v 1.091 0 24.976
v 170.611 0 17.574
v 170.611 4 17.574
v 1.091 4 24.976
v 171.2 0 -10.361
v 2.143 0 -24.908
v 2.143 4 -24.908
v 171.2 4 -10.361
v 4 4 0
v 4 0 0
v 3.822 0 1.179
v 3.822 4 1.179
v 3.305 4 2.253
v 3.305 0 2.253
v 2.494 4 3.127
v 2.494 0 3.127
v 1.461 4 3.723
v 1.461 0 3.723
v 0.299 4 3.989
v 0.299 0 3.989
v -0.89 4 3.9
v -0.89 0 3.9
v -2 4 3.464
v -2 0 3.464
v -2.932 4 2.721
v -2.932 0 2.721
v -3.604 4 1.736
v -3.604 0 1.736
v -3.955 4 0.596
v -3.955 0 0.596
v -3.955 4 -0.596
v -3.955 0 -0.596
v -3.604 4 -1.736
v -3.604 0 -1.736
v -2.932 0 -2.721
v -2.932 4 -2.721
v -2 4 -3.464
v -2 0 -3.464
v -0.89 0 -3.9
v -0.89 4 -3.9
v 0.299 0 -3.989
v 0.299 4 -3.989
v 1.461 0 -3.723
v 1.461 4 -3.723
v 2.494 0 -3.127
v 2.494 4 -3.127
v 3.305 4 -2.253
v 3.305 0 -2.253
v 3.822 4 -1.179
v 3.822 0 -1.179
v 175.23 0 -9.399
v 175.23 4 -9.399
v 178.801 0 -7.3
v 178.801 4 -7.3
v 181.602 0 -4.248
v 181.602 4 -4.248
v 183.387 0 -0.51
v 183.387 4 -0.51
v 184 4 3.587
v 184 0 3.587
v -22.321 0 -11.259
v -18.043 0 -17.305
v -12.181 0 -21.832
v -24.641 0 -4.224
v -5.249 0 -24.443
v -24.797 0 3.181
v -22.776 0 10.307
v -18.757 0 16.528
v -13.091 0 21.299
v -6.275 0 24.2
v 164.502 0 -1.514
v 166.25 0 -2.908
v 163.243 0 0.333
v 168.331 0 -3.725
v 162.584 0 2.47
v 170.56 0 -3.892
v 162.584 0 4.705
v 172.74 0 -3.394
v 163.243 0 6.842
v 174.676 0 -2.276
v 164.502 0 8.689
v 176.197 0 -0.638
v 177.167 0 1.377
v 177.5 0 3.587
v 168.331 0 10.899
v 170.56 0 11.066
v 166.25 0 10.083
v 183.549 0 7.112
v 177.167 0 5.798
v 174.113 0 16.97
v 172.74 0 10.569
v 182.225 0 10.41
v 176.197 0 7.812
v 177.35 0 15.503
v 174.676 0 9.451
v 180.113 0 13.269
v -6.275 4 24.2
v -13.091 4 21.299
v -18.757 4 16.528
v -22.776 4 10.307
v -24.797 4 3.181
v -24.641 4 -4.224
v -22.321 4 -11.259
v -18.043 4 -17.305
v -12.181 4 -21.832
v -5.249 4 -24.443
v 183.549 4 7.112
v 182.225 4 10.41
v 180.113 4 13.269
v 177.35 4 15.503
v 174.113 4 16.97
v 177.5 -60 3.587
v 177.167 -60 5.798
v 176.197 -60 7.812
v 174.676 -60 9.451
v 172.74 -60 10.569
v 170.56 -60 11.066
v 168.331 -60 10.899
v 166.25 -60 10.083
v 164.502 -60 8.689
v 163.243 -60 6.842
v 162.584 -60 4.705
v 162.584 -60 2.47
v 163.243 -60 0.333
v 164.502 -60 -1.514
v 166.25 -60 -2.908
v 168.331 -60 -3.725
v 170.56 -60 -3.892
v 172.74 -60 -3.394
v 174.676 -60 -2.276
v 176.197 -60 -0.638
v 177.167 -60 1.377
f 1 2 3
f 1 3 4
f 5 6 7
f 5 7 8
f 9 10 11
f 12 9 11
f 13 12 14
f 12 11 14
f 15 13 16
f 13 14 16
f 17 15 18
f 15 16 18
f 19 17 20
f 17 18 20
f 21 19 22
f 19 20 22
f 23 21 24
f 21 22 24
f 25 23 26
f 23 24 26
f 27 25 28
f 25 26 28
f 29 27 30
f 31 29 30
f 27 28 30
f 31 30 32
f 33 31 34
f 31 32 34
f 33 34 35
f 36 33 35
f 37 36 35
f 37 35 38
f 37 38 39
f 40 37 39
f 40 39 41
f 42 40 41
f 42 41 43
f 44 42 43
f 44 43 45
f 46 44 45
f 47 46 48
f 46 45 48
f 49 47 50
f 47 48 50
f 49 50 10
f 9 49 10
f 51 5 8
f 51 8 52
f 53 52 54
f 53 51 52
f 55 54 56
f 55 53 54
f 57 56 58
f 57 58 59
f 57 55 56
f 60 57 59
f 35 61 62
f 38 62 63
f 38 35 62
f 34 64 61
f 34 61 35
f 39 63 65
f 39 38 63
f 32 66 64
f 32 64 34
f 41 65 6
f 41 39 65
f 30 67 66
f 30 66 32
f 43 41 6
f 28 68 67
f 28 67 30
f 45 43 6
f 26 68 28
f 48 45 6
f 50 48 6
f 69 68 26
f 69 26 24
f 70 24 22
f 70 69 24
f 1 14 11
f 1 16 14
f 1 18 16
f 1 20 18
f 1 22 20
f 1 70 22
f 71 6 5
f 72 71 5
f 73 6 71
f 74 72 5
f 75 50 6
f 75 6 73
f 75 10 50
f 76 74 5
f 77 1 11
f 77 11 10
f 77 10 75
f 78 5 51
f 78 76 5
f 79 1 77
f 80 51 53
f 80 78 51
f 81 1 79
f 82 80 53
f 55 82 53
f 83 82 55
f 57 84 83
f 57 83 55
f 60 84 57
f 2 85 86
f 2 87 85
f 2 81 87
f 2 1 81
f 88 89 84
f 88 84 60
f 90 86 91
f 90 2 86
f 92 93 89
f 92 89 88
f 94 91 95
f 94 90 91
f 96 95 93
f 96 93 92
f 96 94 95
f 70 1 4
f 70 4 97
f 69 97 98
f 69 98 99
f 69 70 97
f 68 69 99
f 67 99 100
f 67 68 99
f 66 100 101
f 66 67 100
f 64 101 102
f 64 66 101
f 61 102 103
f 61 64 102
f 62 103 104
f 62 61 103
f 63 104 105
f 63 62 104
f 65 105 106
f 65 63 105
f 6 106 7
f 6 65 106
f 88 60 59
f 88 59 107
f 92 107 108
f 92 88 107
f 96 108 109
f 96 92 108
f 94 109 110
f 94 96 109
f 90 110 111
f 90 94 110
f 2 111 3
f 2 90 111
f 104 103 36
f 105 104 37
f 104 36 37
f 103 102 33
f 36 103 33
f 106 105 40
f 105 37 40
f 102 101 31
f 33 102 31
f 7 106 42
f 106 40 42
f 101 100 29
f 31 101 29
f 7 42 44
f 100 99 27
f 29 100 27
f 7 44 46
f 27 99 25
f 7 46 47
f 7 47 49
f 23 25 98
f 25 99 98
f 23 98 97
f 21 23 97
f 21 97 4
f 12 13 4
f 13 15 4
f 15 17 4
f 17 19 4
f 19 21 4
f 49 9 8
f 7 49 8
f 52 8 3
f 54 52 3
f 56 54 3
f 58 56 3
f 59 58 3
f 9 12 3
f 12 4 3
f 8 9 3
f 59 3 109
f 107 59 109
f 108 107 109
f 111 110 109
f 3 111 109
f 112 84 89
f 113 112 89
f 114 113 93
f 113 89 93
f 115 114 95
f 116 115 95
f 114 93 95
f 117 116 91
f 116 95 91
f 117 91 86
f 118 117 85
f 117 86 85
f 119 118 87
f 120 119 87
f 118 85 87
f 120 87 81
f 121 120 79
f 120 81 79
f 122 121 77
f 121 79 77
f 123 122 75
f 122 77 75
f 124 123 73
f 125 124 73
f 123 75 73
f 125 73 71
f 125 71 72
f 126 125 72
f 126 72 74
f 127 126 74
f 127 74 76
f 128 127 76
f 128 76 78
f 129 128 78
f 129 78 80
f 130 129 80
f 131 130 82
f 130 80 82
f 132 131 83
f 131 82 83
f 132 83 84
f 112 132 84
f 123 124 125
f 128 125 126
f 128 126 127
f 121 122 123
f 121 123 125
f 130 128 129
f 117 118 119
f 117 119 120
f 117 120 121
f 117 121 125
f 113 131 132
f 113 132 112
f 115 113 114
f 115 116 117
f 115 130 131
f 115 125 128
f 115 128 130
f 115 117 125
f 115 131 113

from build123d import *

# Parameters (mm, degrees)
F0_R     = 4
F0_R_2   = 7.5
F1_DEPTH = 4
F2_DEPTH = 60


with BuildPart() as f1:
    # F0 (on Front) → F1 (new body)
    with BuildSketch(Plane.XZ):
        with BuildLine():
            ThreePointArc((2.14326, -24.907959), (18.419847, -16.902936), (25, 0))
            ThreePointArc((25, 0), (18.059137, 17.287787), (1.090594, 24.976201))
            ThreePointArc((1.090594, 24.976201), (-24.994436, -0.527438), (2.14326, -24.907959))
        make_face()
        Circle(F0_R, mode=Mode.SUBTRACT)
        with BuildLine():
            ThreePointArc((1.090594, 24.976201), (18.059137, 17.287787), (25, 0))
            ThreePointArc((25, 0), (18.419847, -16.902936), (2.14326, -24.907959))
            Line((2.14326, -24.907959), (171.200226, -10.361081))
            ThreePointArc((171.200226, -10.361081), (156.003116, 3.292011), (170.610733, 17.574048))
            Line((170.610733, 17.574048), (1.090594, 24.976201))
        make_face()
        with BuildLine():
            ThreePointArc((184, 3.587376), (180.113117, 13.268537), (170.610733, 17.574048))
            ThreePointArc((170.610733, 17.574048), (156.003116, 3.292011), (171.200226, -10.361081))
            ThreePointArc((171.200226, -10.361081), (180.315114, -5.878268), (184, 3.587376))
        make_face()
        with Locations((170, 3.587376)):
            Circle(F0_R_2, mode=Mode.SUBTRACT)
        with Locations((170, 3.587376)):
            Circle(F0_R_2)
    extrude(amount=-F1_DEPTH)

    # F0 (on Front) → F2 (join)
    with BuildSketch(Plane.XZ):
        with Locations((170, 3.587376)):
            Circle(F0_R_2)
    extrude(amount=F2_DEPTH)


solid = f1.part
